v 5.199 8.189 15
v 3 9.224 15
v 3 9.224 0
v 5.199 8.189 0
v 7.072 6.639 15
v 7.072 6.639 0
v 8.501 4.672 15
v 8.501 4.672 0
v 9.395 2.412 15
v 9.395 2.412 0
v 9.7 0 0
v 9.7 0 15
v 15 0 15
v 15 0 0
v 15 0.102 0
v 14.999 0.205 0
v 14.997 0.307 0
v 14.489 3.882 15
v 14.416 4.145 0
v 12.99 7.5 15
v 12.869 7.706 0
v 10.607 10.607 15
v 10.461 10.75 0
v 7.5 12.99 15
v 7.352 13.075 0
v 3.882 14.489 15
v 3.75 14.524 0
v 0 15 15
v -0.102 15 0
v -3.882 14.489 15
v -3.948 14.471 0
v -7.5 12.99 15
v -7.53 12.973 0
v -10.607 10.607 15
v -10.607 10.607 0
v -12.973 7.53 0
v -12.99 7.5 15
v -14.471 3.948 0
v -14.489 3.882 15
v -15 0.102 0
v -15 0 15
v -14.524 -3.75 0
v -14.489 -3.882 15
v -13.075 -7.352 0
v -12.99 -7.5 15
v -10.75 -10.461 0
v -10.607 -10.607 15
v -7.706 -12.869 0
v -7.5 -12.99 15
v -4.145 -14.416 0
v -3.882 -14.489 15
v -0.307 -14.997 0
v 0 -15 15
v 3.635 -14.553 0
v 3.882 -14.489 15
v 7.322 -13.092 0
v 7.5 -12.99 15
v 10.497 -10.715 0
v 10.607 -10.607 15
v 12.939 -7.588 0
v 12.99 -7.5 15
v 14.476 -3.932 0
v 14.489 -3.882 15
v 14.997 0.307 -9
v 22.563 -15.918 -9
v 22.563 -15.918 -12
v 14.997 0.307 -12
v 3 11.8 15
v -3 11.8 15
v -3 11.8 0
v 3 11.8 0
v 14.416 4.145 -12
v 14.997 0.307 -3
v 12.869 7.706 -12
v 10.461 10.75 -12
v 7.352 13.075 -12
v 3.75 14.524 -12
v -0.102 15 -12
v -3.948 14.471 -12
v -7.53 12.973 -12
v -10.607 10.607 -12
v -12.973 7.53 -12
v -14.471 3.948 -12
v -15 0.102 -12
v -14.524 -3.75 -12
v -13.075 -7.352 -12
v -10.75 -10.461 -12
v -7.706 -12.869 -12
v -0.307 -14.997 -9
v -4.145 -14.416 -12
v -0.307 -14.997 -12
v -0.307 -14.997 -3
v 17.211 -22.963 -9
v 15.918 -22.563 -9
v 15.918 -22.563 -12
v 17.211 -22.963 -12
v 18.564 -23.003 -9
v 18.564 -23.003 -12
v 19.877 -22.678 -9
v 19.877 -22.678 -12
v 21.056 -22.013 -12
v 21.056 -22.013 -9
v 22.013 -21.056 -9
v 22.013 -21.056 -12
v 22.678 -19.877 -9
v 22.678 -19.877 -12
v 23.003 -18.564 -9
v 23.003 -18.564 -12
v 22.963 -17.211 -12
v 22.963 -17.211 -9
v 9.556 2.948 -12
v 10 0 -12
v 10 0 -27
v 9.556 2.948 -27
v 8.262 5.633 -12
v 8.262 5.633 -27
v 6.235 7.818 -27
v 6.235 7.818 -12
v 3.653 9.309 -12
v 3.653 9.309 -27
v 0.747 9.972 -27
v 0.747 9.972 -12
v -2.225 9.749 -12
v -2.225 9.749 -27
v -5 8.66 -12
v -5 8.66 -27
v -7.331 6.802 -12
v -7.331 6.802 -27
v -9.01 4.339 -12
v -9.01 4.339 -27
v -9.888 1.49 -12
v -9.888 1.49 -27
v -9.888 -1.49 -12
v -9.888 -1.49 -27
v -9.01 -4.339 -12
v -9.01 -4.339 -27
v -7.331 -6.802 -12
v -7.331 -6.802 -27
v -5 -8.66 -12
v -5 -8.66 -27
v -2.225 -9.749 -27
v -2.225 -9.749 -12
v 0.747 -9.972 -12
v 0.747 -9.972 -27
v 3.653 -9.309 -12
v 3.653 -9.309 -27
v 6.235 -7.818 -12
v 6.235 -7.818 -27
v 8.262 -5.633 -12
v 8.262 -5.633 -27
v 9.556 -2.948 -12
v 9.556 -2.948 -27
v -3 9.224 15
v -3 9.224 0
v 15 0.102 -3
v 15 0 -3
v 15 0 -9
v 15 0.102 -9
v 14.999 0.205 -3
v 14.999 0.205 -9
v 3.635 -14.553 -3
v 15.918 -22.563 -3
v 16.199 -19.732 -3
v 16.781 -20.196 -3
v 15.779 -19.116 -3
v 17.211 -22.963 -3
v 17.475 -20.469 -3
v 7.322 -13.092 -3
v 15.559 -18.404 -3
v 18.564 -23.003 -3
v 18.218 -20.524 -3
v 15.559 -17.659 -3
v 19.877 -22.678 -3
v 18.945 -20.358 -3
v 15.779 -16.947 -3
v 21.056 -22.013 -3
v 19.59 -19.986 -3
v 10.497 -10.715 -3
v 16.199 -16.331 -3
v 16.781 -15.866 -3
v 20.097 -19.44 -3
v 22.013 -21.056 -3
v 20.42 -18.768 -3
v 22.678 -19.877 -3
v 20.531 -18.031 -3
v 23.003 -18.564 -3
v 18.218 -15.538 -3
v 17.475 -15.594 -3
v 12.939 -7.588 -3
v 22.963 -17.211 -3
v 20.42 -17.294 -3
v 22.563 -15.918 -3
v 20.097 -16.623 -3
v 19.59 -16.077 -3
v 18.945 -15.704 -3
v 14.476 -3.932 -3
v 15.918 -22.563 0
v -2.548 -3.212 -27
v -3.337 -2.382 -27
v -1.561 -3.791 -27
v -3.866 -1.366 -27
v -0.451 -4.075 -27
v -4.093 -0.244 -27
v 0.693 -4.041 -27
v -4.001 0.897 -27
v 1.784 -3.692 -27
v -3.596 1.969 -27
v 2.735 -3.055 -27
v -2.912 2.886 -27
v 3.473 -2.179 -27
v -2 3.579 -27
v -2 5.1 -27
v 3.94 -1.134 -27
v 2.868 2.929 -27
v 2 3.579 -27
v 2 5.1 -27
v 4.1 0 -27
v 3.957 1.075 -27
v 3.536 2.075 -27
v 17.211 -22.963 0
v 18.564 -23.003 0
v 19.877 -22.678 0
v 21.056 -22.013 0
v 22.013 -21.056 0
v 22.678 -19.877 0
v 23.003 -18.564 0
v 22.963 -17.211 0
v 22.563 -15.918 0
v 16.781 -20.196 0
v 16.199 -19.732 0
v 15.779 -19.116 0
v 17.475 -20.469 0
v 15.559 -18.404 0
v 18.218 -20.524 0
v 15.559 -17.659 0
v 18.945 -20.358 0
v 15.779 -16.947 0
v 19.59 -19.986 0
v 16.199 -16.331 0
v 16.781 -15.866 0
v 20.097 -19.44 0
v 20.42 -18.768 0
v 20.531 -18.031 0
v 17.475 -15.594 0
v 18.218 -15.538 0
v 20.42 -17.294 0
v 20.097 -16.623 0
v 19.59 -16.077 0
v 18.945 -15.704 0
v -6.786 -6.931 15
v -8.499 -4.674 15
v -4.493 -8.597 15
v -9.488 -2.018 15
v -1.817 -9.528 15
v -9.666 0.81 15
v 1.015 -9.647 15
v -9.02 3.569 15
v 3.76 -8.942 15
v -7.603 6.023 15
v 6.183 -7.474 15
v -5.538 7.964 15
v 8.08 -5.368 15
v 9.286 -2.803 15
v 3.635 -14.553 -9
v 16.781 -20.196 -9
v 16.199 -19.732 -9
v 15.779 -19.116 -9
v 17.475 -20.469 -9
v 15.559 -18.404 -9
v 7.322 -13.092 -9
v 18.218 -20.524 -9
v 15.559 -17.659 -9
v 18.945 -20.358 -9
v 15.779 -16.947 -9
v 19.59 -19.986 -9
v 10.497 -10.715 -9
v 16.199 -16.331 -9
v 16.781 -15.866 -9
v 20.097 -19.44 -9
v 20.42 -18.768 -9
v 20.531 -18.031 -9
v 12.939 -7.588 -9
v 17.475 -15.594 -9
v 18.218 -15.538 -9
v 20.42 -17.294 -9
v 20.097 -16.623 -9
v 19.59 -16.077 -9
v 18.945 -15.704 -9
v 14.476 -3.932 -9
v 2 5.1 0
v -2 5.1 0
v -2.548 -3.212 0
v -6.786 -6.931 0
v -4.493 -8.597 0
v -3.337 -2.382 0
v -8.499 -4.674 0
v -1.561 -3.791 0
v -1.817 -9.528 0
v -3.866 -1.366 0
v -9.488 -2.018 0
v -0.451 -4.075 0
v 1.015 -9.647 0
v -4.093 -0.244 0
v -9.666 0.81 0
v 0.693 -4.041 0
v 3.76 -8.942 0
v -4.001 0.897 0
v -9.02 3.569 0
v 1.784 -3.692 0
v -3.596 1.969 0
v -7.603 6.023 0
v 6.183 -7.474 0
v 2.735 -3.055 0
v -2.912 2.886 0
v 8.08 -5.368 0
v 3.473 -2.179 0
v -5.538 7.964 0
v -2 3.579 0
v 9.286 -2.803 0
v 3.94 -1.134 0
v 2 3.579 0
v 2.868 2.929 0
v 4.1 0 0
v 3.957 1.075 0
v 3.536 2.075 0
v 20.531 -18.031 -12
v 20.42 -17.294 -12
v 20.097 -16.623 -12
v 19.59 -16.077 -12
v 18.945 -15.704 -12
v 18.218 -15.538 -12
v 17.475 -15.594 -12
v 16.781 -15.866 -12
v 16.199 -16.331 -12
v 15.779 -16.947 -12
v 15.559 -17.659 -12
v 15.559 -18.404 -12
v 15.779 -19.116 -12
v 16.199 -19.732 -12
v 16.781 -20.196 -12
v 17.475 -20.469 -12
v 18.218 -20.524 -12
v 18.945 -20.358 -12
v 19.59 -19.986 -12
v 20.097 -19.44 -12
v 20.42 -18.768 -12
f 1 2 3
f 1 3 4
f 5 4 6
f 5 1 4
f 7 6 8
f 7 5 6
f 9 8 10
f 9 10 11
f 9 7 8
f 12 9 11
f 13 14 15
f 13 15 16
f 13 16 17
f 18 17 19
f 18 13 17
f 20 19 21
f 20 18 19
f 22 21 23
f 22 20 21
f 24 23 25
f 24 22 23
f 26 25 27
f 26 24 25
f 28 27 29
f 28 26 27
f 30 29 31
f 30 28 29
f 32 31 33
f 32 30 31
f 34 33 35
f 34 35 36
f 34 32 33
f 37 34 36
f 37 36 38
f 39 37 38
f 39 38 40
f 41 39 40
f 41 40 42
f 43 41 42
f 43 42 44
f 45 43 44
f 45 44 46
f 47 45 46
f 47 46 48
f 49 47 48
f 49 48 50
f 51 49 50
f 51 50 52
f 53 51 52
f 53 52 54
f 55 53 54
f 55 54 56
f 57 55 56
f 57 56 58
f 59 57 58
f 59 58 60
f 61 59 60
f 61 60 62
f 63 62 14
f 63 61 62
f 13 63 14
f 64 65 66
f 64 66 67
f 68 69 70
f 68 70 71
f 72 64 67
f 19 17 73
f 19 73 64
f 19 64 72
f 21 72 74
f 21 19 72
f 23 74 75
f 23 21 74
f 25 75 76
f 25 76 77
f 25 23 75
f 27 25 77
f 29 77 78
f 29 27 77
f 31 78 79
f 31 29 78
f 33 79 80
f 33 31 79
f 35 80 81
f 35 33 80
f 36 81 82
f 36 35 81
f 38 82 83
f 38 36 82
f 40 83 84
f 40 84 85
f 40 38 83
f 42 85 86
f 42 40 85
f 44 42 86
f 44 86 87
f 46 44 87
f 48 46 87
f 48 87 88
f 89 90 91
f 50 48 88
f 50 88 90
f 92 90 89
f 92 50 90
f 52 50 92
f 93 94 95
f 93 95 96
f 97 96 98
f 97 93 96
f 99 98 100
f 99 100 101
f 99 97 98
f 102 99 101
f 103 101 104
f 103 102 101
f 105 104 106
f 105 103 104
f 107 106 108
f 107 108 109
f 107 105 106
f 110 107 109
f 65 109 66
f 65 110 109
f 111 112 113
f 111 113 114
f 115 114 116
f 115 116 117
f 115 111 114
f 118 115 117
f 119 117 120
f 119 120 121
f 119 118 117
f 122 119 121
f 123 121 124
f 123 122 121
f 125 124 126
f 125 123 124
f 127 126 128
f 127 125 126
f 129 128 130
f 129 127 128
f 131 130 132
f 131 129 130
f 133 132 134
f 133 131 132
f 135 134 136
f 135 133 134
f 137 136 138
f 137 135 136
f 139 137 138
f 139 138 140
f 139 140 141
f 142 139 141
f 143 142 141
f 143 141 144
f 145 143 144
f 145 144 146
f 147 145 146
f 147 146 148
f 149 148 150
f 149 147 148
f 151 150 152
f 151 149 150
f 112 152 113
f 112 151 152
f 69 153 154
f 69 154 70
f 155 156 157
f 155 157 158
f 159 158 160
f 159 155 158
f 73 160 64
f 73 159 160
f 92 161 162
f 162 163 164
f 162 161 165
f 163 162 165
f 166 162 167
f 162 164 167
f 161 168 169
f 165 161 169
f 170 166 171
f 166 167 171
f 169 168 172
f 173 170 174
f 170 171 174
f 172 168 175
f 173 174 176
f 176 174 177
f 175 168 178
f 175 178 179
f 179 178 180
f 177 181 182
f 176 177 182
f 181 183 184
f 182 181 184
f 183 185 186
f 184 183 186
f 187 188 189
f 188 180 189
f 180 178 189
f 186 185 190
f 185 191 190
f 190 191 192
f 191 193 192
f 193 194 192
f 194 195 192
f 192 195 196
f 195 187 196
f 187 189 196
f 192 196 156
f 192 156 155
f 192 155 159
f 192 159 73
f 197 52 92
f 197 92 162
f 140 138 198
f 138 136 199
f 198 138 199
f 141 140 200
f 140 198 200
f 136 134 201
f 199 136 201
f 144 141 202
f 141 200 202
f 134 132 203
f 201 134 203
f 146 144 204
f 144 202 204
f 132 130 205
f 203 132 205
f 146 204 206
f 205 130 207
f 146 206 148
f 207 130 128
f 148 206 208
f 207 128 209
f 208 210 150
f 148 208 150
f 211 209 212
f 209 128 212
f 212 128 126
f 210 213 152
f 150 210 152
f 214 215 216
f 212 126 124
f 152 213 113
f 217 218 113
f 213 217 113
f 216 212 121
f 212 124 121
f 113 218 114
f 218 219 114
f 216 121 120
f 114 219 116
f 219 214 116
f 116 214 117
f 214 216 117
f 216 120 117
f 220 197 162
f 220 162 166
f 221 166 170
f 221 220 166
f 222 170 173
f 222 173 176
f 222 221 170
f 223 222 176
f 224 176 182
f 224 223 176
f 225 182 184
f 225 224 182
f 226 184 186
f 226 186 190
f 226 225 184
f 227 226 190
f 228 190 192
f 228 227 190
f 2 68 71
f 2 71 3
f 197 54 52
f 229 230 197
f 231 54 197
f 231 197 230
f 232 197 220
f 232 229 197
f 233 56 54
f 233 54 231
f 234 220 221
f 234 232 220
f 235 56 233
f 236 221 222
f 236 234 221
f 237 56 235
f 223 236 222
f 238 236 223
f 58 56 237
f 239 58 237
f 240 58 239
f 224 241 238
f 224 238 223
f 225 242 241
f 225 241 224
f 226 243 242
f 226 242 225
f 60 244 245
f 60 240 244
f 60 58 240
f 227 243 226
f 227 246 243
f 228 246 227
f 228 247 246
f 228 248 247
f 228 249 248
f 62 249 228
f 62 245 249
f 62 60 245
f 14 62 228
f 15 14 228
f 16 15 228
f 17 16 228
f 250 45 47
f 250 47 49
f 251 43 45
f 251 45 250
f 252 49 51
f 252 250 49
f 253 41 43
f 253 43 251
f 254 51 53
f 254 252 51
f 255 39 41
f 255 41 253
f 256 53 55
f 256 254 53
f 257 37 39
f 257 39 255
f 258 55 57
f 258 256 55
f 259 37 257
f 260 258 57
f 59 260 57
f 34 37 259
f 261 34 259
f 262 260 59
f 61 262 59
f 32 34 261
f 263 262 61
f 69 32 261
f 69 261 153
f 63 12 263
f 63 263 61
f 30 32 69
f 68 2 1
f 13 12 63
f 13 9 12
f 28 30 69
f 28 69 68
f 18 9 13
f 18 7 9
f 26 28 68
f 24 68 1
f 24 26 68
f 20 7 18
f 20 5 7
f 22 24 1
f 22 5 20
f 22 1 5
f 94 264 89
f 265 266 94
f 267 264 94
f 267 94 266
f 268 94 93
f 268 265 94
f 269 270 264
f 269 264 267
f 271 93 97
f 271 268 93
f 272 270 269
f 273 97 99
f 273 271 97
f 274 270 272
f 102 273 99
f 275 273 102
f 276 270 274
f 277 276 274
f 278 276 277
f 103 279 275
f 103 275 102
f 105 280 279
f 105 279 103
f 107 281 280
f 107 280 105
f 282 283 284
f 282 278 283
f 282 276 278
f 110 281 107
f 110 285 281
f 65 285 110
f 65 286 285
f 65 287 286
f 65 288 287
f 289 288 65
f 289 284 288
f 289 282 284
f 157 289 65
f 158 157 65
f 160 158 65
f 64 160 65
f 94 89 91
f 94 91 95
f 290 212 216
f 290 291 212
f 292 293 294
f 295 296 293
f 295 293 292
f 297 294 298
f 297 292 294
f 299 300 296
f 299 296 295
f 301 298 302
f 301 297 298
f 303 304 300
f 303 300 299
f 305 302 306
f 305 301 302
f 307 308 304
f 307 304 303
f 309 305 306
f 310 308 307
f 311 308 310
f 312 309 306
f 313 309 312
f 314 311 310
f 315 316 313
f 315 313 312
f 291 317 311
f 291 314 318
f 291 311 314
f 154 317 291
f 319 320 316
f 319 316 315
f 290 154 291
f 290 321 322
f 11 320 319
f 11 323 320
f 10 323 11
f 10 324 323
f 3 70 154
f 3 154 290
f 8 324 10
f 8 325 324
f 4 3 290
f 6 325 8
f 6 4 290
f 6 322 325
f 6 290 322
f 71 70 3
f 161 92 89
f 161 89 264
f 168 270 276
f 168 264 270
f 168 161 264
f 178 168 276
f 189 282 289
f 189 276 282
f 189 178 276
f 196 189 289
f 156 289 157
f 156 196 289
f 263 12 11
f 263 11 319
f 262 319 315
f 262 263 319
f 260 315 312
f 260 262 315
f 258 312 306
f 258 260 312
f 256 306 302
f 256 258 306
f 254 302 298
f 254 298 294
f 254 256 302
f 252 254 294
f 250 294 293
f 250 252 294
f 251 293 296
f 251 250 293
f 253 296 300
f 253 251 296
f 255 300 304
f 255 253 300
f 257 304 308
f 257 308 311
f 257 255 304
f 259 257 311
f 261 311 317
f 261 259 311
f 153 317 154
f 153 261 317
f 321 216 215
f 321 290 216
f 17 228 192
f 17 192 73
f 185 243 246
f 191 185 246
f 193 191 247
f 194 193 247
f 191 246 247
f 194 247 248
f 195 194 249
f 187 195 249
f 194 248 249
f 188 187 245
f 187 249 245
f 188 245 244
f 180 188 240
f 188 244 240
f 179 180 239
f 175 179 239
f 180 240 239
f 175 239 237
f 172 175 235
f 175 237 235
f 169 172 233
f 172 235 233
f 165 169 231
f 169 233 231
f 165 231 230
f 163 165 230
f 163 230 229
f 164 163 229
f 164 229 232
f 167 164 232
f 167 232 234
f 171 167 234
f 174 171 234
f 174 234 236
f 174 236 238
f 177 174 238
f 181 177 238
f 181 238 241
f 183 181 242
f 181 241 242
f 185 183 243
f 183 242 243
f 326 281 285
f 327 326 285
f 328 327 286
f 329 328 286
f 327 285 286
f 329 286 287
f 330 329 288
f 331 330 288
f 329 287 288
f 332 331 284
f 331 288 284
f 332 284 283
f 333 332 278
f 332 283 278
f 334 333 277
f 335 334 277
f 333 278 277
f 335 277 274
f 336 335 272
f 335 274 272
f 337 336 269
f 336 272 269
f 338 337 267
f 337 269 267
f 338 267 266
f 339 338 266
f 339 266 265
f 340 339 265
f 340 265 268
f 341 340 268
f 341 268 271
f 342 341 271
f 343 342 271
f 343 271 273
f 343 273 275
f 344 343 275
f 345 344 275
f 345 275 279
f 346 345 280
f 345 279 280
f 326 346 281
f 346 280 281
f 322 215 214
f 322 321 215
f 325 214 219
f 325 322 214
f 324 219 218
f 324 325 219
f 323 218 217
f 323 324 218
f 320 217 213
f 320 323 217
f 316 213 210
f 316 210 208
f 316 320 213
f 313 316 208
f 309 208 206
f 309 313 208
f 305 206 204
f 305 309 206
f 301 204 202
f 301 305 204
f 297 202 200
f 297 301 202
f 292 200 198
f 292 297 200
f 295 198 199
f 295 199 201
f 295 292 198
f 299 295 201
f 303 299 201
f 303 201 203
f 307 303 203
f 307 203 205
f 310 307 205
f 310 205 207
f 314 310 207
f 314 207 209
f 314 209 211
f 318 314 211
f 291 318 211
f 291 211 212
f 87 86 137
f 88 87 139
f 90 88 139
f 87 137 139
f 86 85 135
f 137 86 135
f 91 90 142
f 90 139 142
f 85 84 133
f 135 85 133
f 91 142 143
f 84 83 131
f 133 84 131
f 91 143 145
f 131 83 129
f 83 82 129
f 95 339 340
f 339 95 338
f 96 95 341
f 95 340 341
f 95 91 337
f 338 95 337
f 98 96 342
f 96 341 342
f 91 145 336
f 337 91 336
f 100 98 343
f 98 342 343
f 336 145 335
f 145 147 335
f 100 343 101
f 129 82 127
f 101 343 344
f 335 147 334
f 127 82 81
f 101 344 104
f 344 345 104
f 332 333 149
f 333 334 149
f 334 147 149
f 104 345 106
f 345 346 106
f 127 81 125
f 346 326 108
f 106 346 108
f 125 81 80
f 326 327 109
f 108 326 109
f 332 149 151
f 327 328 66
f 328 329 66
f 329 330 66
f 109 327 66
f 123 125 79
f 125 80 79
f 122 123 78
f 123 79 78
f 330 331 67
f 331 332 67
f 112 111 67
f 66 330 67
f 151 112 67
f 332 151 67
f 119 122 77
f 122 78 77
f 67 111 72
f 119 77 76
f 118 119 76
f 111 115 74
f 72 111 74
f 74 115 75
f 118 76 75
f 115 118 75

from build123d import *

# Parameters (mm, degrees)
BOSS_EXTRUDE4_DEPTH = 12
SKETCH3_4_R         = 5
SKETCH3_4_R_2       = 2.5
BOSS_EXTRUDE5_DEPTH = 3
BOSS_EXTRUDE6_START = -9
SKETCH3_5_R         = 5
SKETCH3_5_R_2       = 2.5
BOSS_EXTRUDE6_DEPTH = 3
BOSS_EXTRUDE7_START = -12
SKETCH2_R           = 10
BOSS_EXTRUDE7_DEPTH = 15
BOSS_EXTRUDE8_START = 15
SKETCH5_R           = 15
BOSS_EXTRUDE8_DEPTH = 15


with BuildPart() as part:
    # Sketch3 → Boss-Extrude4 (new body)
    with BuildSketch(Plane.XY):
        with BuildLine():
            ThreePointArc((15, 0), (14.999214481, 0.153508816), (14.996858006, 0.307001554))
            ThreePointArc((14.996858006, 0.307001554), (-10.606601718, 10.606601718), (-0.307001554, -14.996858006))
            ThreePointArc((-0.307001554, -14.996858006), (10.497499147, -10.714593397), (15, 0))
        make_face()
        with BuildLine():
            ThreePointArc((4.1, 0), (-2.074849392, -3.536240942), (-2, 3.579106034))
            Line((-2, 3.579106034), (-2, 5.1))
            Line((-2, 5.1), (2, 5.1))
            Line((2, 5.1), (2, 3.579106034))
            ThreePointArc((2, 3.579106034), (3.536240942, 2.074849392), (4.1, 0))
        make_face(mode=Mode.SUBTRACT)
    extrude(amount=-BOSS_EXTRUDE4_DEPTH)

    # Sketch3<4> → Boss-Extrude5 (add)
    # profile 1 of 2: a face of its own
    with BuildSketch(Plane.XY):
        with BuildLine():
            ThreePointArc((15.918131612, -22.562761855), (14.495689014, -14.495689014), (22.562761855, -15.918131612))
            Line((22.562761855, -15.918131612), (14.996858006, 0.307001554))
            ThreePointArc((14.996858006, 0.307001554), (14.999214481, 0.153508816), (15, 0))
            ThreePointArc((15, 0), (10.497499147, -10.714593397), (-0.307001554, -14.996858006))
            Line((-0.307001554, -14.996858006), (15.918131612, -22.562761855))
        make_face()
    # profile 2 of 2: a face of its own
    with BuildSketch(Plane.XY):
        with Locations((18.03122292, -18.03122292)):
            Circle(SKETCH3_4_R)
        with Locations((18.03122292, -18.03122292)):
            Circle(SKETCH3_4_R_2, mode=Mode.SUBTRACT)
    extrude(amount=-BOSS_EXTRUDE5_DEPTH)

    # Sketch3<5> → Boss-Extrude6 (add)
    # profile 1 of 2: a face of its own
    with BuildSketch(Plane.XY.offset(BOSS_EXTRUDE6_START)):
        with BuildLine():
            ThreePointArc((15.918131612, -22.562761855), (14.495689014, -14.495689014), (22.562761855, -15.918131612))
            Line((22.562761855, -15.918131612), (14.996858006, 0.307001554))
            ThreePointArc((14.996858006, 0.307001554), (14.999214481, 0.153508816), (15, 0))
            ThreePointArc((15, 0), (10.497499147, -10.714593397), (-0.307001554, -14.996858006))
            Line((-0.307001554, -14.996858006), (15.918131612, -22.562761855))
        make_face()
    # profile 2 of 2: a face of its own
    with BuildSketch(Plane.XY.offset(BOSS_EXTRUDE6_START)):
        with Locations((18.03122292, -18.03122292)):
            Circle(SKETCH3_5_R)
        with Locations((18.03122292, -18.03122292)):
            Circle(SKETCH3_5_R_2, mode=Mode.SUBTRACT)
    extrude(amount=-BOSS_EXTRUDE6_DEPTH)

    # Sketch2 → Boss-Extrude7 (add)
    with BuildSketch(Plane.XY.offset(BOSS_EXTRUDE7_START)):
        Circle(SKETCH2_R)
        with BuildLine():
            ThreePointArc((4.1, 0), (-2.074849392, -3.536240942), (-2, 3.579106034))
            Line((-2, 3.579106034), (-2, 5.1))
            Line((-2, 5.1), (2, 5.1))
            Line((2, 5.1), (2, 3.579106034))
            ThreePointArc((2, 3.579106034), (3.536240942, 2.074849392), (4.1, 0))
        make_face(mode=Mode.SUBTRACT)
    extrude(amount=-BOSS_EXTRUDE7_DEPTH)

    # Sketch5 → Boss-Extrude8 (add)
    with BuildSketch(Plane.XY.offset(BOSS_EXTRUDE8_START)):
        Circle(SKETCH5_R)
        with BuildLine():
            Line((-3, 9.224424101), (-3, 11.8))
            Line((-3, 11.8), (3, 11.8))
            Line((3, 11.8), (3, 9.224424101))
            ThreePointArc((3, 9.224424101), (7.848248212, 5.70043858), (9.7, 0))
            ThreePointArc((9.7, 0), (-5.70043858, -7.848248212), (-3, 9.224424101))
        make_face(mode=Mode.SUBTRACT)
    extrude(amount=-BOSS_EXTRUDE8_DEPTH)


solid = part.part
